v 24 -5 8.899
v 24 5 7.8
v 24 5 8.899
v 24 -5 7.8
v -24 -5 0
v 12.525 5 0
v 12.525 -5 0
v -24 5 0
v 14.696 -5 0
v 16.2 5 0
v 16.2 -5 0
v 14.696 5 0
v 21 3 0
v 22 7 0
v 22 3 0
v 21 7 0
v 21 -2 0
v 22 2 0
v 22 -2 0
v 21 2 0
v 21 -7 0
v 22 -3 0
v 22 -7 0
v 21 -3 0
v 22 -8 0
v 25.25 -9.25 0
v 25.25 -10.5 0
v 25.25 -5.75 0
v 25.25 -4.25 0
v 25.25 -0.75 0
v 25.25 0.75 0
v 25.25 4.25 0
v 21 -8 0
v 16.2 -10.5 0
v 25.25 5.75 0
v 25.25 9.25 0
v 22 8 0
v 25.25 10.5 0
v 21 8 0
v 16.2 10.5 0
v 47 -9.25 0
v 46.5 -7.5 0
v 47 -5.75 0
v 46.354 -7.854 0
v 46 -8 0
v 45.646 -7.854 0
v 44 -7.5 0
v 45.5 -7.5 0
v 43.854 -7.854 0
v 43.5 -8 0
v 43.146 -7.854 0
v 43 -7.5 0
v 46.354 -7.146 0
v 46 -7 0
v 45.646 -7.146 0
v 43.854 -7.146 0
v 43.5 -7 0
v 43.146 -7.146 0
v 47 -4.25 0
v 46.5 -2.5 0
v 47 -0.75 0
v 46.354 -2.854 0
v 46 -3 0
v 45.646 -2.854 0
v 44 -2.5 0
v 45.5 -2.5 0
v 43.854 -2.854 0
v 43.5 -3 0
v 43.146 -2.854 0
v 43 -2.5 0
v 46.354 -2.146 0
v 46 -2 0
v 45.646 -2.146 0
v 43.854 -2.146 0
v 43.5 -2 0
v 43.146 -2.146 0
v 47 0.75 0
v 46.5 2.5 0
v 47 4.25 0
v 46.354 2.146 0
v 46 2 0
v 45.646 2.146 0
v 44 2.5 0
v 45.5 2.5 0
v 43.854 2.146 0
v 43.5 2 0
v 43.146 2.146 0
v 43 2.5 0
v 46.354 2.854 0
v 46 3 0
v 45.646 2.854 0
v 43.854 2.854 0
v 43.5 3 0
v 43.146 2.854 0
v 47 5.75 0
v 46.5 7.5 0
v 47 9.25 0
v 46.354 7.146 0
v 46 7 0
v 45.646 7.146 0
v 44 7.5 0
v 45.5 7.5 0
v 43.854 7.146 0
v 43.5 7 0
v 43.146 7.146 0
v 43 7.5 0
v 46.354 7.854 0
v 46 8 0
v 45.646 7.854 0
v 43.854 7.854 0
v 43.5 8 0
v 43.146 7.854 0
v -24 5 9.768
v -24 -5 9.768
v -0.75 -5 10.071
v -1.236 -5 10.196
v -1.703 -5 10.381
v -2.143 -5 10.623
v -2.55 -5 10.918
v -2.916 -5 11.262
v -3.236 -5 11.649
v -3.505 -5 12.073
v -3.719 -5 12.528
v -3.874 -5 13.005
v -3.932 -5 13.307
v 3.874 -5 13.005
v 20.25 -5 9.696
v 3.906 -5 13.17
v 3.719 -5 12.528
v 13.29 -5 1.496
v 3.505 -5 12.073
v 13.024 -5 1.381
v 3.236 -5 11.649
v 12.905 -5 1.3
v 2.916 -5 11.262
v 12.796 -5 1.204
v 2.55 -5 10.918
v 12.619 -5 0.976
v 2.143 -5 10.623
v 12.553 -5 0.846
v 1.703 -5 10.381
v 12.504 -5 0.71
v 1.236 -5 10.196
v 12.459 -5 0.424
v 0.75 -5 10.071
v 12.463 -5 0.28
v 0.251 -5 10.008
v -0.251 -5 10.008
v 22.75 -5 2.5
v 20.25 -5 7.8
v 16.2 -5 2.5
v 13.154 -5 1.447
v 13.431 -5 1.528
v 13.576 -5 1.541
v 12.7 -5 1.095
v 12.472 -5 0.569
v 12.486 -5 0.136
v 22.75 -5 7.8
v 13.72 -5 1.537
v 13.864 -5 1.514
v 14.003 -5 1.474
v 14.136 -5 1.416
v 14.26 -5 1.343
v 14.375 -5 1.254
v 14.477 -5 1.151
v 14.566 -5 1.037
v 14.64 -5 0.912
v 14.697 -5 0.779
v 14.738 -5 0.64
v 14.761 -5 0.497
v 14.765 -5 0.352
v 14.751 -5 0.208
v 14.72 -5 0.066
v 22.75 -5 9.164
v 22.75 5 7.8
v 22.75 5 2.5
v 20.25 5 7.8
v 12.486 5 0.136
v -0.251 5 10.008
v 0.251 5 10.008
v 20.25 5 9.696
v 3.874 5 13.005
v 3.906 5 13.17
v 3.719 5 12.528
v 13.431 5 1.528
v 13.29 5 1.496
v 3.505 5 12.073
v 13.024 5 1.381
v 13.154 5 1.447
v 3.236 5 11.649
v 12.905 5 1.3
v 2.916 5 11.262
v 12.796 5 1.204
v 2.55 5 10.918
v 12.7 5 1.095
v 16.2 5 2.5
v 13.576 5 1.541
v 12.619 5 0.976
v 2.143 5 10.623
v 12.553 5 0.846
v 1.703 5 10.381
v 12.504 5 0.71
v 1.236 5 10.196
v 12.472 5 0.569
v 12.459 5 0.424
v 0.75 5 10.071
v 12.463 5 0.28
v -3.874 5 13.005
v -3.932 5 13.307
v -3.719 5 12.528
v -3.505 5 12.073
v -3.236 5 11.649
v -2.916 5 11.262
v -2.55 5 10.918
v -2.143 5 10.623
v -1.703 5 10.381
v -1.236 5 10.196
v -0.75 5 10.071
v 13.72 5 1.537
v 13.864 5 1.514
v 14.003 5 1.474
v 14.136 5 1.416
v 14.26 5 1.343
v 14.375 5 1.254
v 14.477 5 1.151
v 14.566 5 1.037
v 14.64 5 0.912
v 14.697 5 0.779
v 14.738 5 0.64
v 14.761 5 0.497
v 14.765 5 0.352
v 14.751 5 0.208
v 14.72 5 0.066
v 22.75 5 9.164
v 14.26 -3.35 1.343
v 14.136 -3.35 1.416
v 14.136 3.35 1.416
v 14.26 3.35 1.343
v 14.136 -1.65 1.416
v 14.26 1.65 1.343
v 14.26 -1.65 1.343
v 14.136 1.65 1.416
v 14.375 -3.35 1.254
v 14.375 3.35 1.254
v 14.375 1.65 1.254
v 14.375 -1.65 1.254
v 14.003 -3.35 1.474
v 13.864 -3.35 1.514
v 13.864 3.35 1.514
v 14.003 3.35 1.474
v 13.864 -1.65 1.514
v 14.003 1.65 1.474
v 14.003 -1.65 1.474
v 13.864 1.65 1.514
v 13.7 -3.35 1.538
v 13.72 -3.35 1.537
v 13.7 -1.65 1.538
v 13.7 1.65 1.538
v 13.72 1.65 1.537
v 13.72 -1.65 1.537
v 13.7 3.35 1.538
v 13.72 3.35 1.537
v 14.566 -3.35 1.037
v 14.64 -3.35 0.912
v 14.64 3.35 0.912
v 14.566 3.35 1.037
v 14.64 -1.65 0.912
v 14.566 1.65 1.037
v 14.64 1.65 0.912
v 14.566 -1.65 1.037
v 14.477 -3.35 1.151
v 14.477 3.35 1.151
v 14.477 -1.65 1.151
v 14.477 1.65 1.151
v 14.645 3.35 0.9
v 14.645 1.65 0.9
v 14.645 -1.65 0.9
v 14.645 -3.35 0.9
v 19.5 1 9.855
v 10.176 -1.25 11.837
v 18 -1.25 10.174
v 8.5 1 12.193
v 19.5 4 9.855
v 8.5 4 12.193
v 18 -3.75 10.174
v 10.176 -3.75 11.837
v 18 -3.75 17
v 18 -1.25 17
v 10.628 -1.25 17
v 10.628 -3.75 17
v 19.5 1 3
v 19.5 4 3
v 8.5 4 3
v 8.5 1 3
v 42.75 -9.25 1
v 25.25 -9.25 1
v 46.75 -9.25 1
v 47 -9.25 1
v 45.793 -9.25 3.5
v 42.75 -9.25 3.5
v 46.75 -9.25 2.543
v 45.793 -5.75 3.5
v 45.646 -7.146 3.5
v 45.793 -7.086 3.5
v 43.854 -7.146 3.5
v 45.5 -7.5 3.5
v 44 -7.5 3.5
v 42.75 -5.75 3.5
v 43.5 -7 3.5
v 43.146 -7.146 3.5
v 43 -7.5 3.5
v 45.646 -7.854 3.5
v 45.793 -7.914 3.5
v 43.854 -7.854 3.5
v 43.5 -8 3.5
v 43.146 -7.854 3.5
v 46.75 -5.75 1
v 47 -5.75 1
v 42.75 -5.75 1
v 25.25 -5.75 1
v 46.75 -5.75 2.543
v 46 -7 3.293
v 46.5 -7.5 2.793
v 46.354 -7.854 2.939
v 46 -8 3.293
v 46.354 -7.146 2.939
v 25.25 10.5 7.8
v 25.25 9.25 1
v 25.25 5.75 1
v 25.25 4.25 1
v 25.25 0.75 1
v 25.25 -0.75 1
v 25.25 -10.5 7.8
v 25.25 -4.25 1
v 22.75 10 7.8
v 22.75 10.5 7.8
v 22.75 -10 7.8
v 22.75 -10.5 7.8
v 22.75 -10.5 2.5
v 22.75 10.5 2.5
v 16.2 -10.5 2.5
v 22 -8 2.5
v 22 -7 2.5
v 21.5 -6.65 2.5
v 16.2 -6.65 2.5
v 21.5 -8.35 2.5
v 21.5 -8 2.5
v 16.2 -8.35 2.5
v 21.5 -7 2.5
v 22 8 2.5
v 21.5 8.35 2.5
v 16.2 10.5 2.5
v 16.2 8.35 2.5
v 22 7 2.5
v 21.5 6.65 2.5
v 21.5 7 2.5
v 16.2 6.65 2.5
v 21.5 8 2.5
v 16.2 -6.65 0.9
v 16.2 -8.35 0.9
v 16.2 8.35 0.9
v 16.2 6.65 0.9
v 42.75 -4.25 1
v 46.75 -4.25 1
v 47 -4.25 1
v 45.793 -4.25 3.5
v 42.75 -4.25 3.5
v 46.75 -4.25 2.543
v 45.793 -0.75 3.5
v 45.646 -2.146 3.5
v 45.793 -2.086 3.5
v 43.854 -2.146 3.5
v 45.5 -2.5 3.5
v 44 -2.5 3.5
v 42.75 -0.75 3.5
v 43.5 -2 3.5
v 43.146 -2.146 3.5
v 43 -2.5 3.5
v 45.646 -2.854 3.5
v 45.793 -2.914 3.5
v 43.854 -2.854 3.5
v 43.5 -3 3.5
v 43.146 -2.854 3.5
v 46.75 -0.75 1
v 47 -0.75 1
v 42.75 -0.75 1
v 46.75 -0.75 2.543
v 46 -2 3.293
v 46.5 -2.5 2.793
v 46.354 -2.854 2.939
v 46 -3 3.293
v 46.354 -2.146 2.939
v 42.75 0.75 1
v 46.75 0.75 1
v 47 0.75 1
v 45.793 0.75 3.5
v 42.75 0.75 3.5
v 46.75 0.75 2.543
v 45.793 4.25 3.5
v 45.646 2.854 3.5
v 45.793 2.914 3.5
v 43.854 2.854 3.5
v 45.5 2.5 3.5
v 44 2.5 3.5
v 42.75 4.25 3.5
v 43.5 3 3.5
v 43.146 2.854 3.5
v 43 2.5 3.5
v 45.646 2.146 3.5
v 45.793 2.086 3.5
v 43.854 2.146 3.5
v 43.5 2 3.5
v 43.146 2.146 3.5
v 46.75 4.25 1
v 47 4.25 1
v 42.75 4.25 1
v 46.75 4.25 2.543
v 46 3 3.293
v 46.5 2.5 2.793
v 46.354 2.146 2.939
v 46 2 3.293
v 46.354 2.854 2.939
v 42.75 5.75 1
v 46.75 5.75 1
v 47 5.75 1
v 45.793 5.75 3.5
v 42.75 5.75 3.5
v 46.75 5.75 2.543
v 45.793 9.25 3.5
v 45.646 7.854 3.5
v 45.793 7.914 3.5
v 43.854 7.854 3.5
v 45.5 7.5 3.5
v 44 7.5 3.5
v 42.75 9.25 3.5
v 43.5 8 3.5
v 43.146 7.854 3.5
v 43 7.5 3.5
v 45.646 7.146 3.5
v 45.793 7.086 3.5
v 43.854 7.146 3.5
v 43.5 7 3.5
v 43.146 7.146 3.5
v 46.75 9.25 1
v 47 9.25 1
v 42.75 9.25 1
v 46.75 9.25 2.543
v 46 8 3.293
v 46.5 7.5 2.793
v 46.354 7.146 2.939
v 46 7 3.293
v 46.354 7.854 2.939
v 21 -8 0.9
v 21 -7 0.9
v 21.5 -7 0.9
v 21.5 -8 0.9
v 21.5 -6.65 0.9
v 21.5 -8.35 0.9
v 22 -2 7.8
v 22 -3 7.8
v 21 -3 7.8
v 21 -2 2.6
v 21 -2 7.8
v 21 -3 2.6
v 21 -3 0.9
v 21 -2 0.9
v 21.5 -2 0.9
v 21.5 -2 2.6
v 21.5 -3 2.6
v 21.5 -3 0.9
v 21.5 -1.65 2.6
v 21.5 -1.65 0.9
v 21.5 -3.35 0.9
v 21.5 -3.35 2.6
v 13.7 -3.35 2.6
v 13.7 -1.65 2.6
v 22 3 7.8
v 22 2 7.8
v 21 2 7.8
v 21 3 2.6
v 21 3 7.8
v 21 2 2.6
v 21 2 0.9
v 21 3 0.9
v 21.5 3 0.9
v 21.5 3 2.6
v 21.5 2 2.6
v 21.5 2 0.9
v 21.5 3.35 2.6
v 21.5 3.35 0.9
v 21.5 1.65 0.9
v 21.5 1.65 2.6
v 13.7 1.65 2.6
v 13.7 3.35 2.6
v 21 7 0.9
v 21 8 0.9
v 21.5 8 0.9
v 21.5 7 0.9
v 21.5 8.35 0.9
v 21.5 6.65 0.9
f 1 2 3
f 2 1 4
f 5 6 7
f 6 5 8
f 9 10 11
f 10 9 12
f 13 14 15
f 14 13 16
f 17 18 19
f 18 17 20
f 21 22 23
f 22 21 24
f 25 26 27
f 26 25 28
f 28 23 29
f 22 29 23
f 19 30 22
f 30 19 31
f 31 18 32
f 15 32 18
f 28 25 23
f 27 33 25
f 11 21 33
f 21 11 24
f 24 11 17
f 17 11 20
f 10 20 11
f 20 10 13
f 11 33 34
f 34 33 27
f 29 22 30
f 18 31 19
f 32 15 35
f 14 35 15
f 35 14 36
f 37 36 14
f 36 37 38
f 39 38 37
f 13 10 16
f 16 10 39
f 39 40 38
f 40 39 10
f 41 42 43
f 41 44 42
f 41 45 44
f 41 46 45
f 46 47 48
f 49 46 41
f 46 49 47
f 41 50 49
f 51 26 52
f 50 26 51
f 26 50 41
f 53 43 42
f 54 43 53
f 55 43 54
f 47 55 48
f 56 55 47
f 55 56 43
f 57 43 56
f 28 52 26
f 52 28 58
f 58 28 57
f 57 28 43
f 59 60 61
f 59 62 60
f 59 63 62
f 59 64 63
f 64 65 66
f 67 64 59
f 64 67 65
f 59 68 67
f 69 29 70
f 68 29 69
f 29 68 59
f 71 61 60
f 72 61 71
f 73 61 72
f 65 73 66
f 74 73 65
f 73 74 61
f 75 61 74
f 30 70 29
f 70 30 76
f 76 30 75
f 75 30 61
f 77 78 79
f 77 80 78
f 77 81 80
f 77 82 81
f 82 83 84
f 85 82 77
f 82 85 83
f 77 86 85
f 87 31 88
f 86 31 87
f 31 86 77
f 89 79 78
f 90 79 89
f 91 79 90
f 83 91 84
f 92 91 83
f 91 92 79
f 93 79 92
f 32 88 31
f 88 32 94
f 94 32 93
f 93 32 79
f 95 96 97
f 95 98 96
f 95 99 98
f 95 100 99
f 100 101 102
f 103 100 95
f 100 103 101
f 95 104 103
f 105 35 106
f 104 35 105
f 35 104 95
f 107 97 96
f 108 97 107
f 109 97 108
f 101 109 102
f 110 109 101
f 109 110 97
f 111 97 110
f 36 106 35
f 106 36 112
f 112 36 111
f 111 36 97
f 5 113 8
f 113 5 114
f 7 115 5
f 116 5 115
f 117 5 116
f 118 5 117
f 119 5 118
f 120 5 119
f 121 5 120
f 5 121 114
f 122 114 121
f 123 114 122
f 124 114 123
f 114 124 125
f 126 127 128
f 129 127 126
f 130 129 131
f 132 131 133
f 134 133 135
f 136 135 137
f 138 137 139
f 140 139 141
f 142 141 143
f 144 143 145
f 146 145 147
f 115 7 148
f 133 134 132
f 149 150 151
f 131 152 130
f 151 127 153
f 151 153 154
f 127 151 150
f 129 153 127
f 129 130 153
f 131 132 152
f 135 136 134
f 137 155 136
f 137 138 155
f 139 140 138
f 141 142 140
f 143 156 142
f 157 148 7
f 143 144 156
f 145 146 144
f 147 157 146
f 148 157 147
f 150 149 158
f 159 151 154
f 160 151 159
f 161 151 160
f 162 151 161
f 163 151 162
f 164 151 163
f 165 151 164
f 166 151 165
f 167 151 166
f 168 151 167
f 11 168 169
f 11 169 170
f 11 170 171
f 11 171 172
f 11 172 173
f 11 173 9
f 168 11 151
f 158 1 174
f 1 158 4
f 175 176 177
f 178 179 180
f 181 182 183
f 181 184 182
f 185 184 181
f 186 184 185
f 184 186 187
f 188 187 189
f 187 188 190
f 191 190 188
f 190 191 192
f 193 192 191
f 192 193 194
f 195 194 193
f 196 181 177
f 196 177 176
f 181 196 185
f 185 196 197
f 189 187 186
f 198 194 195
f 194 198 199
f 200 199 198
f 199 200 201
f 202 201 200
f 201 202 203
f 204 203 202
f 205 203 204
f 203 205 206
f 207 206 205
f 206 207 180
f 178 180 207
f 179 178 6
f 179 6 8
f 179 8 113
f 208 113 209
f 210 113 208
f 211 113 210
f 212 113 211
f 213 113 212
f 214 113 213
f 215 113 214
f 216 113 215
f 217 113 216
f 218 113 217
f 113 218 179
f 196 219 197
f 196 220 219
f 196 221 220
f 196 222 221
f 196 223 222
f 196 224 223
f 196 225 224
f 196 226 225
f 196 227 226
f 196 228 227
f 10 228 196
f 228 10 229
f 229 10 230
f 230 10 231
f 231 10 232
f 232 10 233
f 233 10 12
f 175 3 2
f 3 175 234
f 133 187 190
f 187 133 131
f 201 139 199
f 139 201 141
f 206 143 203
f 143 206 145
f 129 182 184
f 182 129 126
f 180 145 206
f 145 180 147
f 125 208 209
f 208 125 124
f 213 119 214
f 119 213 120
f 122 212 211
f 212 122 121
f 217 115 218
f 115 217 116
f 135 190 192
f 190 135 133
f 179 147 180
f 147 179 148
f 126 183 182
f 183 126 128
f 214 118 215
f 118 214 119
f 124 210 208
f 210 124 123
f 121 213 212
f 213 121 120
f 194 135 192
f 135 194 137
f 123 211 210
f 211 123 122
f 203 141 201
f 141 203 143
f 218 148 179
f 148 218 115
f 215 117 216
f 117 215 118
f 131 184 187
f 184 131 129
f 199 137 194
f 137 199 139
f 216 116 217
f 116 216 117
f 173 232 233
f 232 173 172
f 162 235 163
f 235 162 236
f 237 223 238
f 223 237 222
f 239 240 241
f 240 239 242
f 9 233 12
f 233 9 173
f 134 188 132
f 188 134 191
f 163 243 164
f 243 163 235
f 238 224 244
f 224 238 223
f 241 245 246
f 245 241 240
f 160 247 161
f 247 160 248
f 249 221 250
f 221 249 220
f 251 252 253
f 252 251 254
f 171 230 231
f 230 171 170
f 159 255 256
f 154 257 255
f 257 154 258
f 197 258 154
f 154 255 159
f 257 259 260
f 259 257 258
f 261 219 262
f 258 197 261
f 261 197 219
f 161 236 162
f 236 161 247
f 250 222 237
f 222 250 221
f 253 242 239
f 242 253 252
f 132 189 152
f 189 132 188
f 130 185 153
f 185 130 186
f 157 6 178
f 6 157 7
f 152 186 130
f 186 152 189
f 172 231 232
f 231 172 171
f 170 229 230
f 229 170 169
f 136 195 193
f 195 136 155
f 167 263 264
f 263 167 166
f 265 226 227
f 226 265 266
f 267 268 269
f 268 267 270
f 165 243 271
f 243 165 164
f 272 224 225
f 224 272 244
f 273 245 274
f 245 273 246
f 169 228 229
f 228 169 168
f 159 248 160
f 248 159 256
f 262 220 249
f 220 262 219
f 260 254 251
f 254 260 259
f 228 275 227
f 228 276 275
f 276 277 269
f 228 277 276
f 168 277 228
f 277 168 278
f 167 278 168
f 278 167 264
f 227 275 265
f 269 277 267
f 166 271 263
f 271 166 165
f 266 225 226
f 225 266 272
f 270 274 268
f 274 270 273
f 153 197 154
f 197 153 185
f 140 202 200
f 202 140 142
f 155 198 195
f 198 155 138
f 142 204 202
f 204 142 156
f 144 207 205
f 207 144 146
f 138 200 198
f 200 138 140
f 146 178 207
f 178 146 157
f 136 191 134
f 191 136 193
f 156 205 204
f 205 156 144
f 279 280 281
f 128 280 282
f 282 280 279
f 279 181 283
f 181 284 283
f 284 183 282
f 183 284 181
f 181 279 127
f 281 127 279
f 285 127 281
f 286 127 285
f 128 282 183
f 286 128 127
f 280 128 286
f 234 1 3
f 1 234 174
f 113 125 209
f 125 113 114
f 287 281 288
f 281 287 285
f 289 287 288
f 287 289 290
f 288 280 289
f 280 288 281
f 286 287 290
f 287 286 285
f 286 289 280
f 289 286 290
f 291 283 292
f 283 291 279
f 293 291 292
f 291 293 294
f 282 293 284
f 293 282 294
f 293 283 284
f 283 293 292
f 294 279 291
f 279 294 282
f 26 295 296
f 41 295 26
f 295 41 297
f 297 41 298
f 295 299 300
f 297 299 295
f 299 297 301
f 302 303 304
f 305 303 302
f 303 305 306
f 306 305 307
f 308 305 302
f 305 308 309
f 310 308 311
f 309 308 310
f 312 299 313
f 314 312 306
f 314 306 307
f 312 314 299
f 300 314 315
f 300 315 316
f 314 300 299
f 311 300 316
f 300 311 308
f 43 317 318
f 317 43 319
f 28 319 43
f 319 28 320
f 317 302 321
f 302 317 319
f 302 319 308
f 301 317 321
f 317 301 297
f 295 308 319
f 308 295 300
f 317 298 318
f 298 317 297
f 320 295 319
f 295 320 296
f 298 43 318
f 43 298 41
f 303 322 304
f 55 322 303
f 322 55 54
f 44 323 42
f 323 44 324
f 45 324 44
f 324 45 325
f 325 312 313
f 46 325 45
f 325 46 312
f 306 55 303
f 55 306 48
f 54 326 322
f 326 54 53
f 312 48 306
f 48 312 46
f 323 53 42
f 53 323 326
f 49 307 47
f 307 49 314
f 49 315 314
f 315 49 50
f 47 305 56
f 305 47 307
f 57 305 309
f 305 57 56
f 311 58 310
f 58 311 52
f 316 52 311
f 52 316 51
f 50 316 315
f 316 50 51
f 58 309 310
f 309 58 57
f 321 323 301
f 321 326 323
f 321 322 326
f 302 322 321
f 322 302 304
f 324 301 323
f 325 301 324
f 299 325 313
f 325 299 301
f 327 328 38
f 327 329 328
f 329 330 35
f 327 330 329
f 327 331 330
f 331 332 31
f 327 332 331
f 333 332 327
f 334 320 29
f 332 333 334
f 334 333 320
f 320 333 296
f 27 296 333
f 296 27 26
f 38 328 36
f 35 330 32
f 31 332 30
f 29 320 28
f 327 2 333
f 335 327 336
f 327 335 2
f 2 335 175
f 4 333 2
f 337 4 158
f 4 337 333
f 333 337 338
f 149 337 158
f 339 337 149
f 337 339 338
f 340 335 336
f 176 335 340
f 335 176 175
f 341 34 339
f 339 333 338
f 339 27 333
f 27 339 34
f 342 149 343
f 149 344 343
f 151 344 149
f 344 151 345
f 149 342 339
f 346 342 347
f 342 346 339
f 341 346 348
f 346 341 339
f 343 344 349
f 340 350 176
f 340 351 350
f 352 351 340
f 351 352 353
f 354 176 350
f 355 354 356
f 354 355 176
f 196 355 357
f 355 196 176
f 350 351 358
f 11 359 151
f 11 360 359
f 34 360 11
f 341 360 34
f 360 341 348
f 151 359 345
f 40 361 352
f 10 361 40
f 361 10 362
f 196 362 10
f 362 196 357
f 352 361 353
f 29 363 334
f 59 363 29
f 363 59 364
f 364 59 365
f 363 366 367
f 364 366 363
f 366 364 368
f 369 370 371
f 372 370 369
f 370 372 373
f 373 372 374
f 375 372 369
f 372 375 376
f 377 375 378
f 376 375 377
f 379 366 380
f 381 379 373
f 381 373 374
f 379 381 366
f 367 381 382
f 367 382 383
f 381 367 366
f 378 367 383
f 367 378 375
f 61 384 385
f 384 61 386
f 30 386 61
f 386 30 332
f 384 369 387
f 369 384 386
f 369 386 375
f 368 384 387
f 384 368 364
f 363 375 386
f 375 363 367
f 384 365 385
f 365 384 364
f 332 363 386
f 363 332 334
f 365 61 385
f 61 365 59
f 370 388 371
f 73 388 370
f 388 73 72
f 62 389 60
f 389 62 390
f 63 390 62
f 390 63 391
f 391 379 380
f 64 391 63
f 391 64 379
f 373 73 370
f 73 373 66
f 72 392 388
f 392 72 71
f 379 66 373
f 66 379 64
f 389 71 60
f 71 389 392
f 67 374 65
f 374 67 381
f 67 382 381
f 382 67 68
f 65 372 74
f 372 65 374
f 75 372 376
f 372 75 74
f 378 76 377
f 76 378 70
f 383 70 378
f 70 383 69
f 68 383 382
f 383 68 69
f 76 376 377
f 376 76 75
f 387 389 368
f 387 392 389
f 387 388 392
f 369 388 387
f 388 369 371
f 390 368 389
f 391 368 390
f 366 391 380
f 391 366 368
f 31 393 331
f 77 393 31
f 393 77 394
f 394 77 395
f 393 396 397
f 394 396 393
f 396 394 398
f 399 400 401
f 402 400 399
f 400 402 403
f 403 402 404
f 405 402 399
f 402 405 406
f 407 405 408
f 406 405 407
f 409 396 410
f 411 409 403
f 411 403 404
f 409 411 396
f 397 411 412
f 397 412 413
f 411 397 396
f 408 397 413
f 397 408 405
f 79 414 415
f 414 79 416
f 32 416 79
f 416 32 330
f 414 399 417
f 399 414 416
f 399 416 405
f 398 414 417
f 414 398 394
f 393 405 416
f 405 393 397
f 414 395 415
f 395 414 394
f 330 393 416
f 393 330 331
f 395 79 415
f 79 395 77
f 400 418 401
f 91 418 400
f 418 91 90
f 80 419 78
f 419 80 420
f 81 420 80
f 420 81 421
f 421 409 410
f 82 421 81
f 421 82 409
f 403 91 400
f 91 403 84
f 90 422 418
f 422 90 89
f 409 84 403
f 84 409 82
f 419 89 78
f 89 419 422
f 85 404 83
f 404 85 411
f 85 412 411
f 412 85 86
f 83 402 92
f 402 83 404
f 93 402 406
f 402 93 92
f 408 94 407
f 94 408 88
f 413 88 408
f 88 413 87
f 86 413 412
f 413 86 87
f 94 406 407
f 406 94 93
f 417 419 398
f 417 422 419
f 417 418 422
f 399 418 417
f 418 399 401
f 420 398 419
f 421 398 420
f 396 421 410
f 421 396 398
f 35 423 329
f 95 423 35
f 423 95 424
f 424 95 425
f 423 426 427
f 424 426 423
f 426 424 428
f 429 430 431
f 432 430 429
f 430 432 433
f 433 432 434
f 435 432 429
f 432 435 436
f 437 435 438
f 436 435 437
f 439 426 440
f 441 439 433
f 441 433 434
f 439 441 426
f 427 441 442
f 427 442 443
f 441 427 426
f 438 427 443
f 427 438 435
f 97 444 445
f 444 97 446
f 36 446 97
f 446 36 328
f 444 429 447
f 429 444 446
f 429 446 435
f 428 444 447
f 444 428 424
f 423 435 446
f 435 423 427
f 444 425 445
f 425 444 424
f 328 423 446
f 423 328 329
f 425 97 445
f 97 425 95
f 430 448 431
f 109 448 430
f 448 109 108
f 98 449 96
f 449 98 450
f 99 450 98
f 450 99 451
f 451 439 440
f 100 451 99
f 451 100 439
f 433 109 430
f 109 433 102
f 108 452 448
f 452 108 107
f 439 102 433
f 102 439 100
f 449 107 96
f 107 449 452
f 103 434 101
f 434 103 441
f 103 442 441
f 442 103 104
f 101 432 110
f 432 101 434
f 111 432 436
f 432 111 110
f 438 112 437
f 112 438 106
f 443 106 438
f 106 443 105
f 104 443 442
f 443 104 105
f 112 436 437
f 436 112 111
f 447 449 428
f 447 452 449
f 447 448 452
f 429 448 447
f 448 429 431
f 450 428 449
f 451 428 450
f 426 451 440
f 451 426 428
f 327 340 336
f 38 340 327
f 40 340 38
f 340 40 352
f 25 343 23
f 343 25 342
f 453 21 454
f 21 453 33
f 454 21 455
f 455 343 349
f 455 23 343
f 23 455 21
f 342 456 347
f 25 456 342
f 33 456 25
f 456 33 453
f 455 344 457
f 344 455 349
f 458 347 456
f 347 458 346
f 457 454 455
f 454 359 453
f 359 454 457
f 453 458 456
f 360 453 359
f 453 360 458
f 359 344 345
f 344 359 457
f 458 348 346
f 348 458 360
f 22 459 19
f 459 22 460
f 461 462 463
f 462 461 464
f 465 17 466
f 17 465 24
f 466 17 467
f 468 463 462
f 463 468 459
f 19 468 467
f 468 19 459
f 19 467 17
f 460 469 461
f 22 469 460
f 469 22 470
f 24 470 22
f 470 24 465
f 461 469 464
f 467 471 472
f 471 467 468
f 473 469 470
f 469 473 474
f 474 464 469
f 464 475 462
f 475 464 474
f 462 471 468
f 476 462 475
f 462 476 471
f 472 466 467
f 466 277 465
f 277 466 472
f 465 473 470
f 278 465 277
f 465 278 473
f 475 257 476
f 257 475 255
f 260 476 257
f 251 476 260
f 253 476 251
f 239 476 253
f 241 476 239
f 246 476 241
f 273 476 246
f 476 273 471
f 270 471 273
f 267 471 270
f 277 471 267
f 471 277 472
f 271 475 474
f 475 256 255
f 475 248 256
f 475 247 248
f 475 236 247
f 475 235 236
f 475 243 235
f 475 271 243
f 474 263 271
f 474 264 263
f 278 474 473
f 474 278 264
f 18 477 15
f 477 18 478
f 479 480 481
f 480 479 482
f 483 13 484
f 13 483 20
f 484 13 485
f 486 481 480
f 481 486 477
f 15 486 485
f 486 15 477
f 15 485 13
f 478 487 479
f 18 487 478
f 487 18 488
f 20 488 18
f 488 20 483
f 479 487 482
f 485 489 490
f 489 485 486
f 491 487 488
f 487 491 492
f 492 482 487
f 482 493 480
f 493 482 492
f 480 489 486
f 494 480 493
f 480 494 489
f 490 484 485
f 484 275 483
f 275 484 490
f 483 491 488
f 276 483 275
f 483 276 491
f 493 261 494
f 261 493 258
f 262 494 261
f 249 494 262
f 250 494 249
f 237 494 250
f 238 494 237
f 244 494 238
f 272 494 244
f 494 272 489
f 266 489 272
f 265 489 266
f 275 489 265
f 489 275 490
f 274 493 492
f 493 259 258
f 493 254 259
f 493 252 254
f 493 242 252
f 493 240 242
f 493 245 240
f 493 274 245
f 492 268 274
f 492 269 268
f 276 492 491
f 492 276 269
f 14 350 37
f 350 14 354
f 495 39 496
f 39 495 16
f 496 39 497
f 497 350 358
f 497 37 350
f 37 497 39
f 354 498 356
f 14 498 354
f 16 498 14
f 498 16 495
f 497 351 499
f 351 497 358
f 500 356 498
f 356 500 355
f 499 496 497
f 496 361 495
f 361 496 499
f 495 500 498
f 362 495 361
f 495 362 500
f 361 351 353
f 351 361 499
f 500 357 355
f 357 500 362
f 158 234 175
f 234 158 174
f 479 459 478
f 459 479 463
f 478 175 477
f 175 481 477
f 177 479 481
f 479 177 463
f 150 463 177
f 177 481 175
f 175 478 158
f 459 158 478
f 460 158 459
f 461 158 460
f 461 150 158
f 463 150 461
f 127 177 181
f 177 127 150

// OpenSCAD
$fn=8;

ts=2.5; // толщина стенки
tp=1;//диаметр жилы
tpr=1.7;//диаметр провода
trb=[2,tp,2.5];//внешний, внутренний высота
knt=[20,11, 7.5, 7.8];//высота до центра, толщина, высота стопора
lin=[3.5,knt.x+trb.x,1];//ширина, длина, толщина
dkn=4;//длина контактной площадки
shp=4.0;//высота шипа
do=3.8;
step=5;//шаг контактов
kk=4;//количество контактов
//прищепка
prk=[8,10,1.5,24,10];//диаметр опоры, ширина,диаметр проволоки, длина плеча,высота половины

difference(){
    union(){
        prih();
        translate([0, -step*(kk-1)/2, 0]) {
            for(a=[0:1:kk-1]){
                translate([0,a*step,0]){
                    translate([lin.y+prk[3],0,0])rotate([0,0,-90])pin_lin();
                    translate([prk[3],0,knt[3]/2])cube([ts,step+1,knt[3]],true);
                    translate([prk[3]-knt[3]/2,0,ts/2])cube([knt[3],step+1,ts],true);
                }
            }
        }
    }
    for(a=[0:1:kk-1]){
        translate([0,a*step,0]){
            translate([prk[3]-ts,-step*(kk-1)/2,ts])cube([tp,tp,ts*13],true);
            translate([prk[3]-ts-knt[3]/2,-step*(kk-1)/2,ts-tpr/2+0.1])cube([knt[3],tpr,tpr],true);
        }
    }
    translate([prk[3]-ts,0,knt[3]+ts*3/2])cube([ts,prk.y*2,ts*3],true);
}


module prih(){
    $fn=50;
    difference(){
        union(){
            translate([0, 0, (prk[4]+prk[0]/2)])rotate([180,0,0])difference(){
                translate([0, 0, (prk[4]+prk[0]/2)/2]) cube([prk[3]*2,prk[1],prk[4]+prk[0]/2],true);
                translate([0, -prk[1]/2-0.5,0])rotate([-90,0,0])cylinder(prk[1]+1,prk[0]/2,prk[0]/2);
                rotate([0,-45,0])translate([prk[3]-prk[0]/2-prk[2]/2, -prk[1]/2-0.5,0])rotate([-90,0,0])cylinder(prk[1]+1,prk[2]/1.3,prk[2]/1.3);
                rotate([0,-12,0])translate([0, 0, -(prk[4]+prk[0]/2)/2]) cube([prk[3]*4,prk[1]*2,prk[4]+prk[0]/2],true);
                rotate([0,10,0])translate([0, 0, -(prk[4]+prk[0]/2)/2]) cube([prk[3]*4,prk[1]*2,prk[4]+prk[0]/2],true);
            }
            difference(){
                translate([prk[3]-prk[1], -2*ts/2, prk[4]]) cube([prk[1]-2,ts,prk[4]*1.4],true);
                translate([prk[3]-prk[1]-(prk[1]-2), -2*ts/2, prk[4]]) rotate([0,5,0])cube([prk[1]-2,ts*2,prk[4]*2],true);
            }
        }
        translate([(prk[3]-prk[1]), 2*ts/2, prk[4]]) cube([prk[1]+1,ts+0.5,prk[4]*1.4],true);
    }
    
}

//all_2();
module all_2(){
    difference(){
        union(){
            for(a=[0:1:kk-1]){
                translate([0,0,a*step])pin2();
            }
            for(a=[0:1:kk-1]){
                translate([knt[3]/2,0,a*step+step/2])ship();
            }
            hh=step*kk;
            translate([knt.y+ts/2, 0, hh/2]) cube([ts,knt.x*2,hh],true);
            translate([knt.y/2, -ts/2, hh/2]) cube([knt.y+ts+lin.z,ts,hh],true);
        }
        for(a=[0:1:kk-1]){
            translate([0,0,a*step])pin3();
        }
        for(a=[0:1:kk-1]){
            translate([0,0,a*step])pin4();
        }
    }
}

module ship(){
    intersection(){
        rotate([-90,0,0])cylinder(shp,do/2,do/2);
        cube([ts,do*4,8],true);
    }
}


module pin4(){
    translate([knt.x/2,-ts-0.1,step/2])cube([knt.x*2,tp,tp],true);;
}

module pin3(){
    translate([knt.y+ts,-knt.x/2-ts,step/2])cube([tpr,knt.x,tpr],true);;
}


module pin2(){
    //translate([-lin.z,knt.x,step/2])rotate([0,90,0])pin();
    translate([-lin.z,knt.x,step/2])rotate([0,90,0])pin_lin();
}

module pin1(){
    translate([0,0,lin.z])rotate([0,180,0])pin();
}
//pin_lin();
module pin(){
    difference(){
        union(){
            cylinder(trb.z+lin.z,trb.x/2,trb.x/2);
            translate([0, trb.x/2-lin.y/2,lin.z/2]) cube(lin,true);
        }
        translate([0,0,-0.1])cylinder(trb.z*2,trb.y/2,trb.y/2);
        translate([0,-(trb.x/2+trb.y),-0.1])cylinder(trb.z*2,trb.y/2,trb.y/2);
        translate([0, 0,trb.z+lin.z+trb.x/4]) rotate([-45,0,0])cube([trb.x*2,trb.x*2,trb.x/2],true);
    }
}
module pin_lin(){
    difference(){
        union(){
            //cylinder(trb.z+lin.z,trb.x/2,trb.x/2);
            translate([0, -trb.z/2,(trb.z+lin.z)/2]) cube([lin.x,dkn,trb.z+lin.z],true);
            translate([0, trb.x/2-lin.y/2,lin.z/2]) cube(lin,true);
        }
        translate([0,0,-0.1])cylinder(trb.z*2,trb.y/2,trb.y/2);
        translate([0,-trb.z,-0.1])cylinder(trb.z*2,trb.y/2,trb.y/2);
        translate([0, 0,trb.z+lin.z+trb.x/4]) rotate([-45,0,0])cube([trb.x*2,trb.x*3,trb.x/2],true);
    }
}
module pin_s(){
    difference(){
        union(){
            cylinder(trb.z+lin.z-trb.x/2,trb.x/2,trb.x/2);
            translate([0, 0,trb.z+lin.z-trb.x/2])sphere(r=trb.x/2);
            translate([0, trb.x/2-lin.y/2,lin.z/2]) cube(lin,true);
        }
        translate([0,0,-0.1])cylinder(trb.z*2,trb.y/2,trb.y/2);
        translate([0,-(trb.x/2+trb.y),-0.1])cylinder(trb.z*2,trb.y/2,trb.y/2);
    }
}
